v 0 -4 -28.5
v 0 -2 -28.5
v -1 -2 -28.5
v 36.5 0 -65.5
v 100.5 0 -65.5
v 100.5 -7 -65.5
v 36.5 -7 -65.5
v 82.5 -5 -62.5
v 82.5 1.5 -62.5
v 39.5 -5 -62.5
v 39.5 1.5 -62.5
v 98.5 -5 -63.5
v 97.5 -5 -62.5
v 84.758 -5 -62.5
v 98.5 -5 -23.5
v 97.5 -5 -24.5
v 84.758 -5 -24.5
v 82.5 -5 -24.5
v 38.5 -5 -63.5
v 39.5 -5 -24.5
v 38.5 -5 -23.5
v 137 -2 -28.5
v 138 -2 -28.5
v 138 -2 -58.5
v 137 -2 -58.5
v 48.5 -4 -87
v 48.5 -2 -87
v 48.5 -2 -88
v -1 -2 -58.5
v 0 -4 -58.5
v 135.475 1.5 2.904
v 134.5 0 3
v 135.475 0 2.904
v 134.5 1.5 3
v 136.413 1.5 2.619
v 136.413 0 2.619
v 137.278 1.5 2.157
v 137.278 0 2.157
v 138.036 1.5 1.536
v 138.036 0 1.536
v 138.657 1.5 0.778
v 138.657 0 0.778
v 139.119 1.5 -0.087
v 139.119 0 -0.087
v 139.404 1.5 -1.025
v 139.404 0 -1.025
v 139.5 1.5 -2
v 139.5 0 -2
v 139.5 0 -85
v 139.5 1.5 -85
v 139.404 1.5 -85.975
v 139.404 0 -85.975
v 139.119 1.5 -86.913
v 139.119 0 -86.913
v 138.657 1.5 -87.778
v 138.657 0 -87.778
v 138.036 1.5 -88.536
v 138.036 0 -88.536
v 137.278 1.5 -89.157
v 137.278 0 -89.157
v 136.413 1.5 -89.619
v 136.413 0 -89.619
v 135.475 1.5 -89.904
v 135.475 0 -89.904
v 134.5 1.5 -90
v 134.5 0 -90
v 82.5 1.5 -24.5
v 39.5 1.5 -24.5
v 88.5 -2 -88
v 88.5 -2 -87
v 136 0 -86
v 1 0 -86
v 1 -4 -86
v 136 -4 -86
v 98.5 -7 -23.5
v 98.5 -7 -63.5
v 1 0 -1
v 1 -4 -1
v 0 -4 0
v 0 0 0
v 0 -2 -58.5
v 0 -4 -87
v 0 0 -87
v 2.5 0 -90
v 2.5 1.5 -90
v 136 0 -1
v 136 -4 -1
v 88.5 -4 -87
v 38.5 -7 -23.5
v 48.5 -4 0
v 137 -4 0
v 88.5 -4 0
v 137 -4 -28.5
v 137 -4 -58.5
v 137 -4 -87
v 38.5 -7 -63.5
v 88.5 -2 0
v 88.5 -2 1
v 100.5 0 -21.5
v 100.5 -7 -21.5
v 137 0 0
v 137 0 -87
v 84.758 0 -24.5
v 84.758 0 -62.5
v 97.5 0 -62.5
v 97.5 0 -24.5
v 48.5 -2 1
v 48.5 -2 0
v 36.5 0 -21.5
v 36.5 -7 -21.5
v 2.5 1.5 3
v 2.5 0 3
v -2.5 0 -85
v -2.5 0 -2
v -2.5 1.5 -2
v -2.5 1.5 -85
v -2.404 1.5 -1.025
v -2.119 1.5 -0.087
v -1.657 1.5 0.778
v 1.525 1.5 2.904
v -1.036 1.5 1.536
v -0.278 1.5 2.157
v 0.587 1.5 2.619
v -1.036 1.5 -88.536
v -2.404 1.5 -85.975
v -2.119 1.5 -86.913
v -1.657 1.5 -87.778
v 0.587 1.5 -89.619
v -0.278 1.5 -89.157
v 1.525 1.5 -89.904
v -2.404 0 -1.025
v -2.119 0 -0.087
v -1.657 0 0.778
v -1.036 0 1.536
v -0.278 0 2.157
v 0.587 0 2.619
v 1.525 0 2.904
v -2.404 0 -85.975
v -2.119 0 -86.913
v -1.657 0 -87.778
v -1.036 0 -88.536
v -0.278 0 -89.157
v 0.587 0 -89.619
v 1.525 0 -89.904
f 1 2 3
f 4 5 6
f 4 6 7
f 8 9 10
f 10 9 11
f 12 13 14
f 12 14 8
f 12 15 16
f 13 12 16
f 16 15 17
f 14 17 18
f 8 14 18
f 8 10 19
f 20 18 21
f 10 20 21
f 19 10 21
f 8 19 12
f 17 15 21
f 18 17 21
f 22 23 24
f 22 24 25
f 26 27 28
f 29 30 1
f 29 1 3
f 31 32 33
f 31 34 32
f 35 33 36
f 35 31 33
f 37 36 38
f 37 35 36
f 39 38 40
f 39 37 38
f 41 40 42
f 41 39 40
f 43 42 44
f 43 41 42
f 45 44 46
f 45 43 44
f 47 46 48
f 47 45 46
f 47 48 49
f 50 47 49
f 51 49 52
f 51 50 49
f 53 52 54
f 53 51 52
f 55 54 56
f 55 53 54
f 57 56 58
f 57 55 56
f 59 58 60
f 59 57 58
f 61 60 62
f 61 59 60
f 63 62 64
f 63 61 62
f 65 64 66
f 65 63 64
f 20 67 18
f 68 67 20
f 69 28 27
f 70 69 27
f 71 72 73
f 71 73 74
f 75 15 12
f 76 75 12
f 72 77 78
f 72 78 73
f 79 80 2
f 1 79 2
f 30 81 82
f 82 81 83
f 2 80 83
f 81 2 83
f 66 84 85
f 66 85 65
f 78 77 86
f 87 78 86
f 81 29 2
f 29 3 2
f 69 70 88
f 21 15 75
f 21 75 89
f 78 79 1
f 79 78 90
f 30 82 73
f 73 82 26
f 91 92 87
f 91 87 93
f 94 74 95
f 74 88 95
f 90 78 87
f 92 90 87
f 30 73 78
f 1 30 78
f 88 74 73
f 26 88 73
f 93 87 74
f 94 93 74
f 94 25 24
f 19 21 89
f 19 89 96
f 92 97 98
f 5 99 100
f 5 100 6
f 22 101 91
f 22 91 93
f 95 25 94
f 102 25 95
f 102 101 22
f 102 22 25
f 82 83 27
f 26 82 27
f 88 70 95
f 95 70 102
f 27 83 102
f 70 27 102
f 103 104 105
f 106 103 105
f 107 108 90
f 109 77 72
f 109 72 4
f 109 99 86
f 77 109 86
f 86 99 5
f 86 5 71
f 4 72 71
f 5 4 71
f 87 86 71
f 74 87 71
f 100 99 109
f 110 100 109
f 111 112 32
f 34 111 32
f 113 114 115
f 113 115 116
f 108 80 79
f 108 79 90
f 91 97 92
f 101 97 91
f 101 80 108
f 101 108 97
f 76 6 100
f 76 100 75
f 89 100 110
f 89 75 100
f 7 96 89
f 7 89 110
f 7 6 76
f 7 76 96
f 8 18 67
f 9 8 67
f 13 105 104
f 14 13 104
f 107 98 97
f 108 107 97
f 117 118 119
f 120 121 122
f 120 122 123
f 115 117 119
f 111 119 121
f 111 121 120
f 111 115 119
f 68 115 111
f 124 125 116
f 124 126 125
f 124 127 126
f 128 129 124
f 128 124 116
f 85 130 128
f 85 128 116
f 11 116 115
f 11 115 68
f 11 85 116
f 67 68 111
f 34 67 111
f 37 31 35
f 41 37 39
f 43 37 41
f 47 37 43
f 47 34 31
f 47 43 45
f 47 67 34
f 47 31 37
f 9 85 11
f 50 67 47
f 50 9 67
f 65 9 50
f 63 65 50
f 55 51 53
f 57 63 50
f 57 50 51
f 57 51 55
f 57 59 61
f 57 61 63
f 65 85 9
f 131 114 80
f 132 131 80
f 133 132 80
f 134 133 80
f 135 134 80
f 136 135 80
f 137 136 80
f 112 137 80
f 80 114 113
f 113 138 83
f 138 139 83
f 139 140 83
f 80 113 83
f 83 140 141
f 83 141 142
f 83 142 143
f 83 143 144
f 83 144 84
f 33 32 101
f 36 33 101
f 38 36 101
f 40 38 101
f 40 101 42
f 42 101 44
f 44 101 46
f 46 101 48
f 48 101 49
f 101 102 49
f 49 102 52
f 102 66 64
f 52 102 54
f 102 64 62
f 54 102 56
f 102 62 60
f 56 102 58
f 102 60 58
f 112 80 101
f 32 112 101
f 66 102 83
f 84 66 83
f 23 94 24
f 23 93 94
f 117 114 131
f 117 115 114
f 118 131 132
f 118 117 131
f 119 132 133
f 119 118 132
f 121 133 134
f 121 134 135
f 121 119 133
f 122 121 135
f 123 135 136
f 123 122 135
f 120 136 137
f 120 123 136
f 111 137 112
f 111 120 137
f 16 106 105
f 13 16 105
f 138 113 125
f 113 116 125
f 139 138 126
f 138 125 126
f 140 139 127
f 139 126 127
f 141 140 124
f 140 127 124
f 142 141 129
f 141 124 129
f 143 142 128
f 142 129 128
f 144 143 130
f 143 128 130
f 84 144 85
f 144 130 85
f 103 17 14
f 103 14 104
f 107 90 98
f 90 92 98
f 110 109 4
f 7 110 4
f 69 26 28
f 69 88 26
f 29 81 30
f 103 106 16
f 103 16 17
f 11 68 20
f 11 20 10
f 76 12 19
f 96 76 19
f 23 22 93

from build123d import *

# Parameters (mm, degrees)
SKETCH1_W                = 142
SKETCH1_H                = 93
BOSS_EXTRUDE1_DEPTH      = 1.5
SKETCH3_W                = 137
SKETCH3_H                = 87
SKETCH3_W_2              = 135
SKETCH3_H_2              = 85
EXTRUDE_THIN1_DEPTH      = 4
FILLET1_R                = 5
BOSS_EXTRUDE2_DEPTH      = 20
BOSS_EXTRUDE2_DEPTH_BACK = 20
BOSS_EXTRUDE3_DEPTH      = 15
BOSS_EXTRUDE3_DEPTH_BACK = 15
SKETCH6_W                = 58
SKETCH6_H                = 38
CUT_EXTRUDE2_DEPTH       = 10
SKETCH6_5_W              = 60
SKETCH6_5_H              = 40
SKETCH6_5_W_2            = 58
SKETCH6_5_H_2            = 38
BOSS_EXTRUDE4_DEPTH      = 5
SKETCH6_6_W              = 64
SKETCH6_6_H              = 44
SKETCH6_6_W_2            = 60
SKETCH6_6_H_2            = 40
BOSS_EXTRUDE5_DEPTH      = 7
SKETCH7_W                = 15
SKETCH7_H                = 38
BOSS_EXTRUDE6_DEPTH      = 1.5
BOSS_EXTRUDE7_REACH      = 67.5
SKETCH8_W                = 2.25753837
SKETCH8_H                = 5


with BuildPart() as part:
    # Sketch1 → Boss-Extrude1 (new body)
    with BuildSketch(Plane(origin=(0, 0, 0), x_dir=(1, 0, 0), z_dir=(0, 1, 0))):
        with Locations((68.5, 43.5)):
            Rectangle(SKETCH1_W, SKETCH1_H)
    extrude(amount=BOSS_EXTRUDE1_DEPTH)

    # Fillet1
    fillet1_edges = [part.edges().sort_by_distance(p)[0] for p in [
        (-2.5, 0.75, -90),
        (139.5, 0.75, -90),
        (139.5, 0.75, 3),
        (-2.5, 0.75, 3),
    ]]
    fillet(fillet1_edges, radius=FILLET1_R)

    # Sketch6 → Cut-Extrude2 (cut)
    with BuildSketch(Plane(origin=(0, 0, 0), x_dir=(-1, 0, 0), z_dir=(0, -1, 0))):
        with Locations((-68.5, 43.5)):
            Rectangle(SKETCH6_W, SKETCH6_H)
    extrude(amount=-CUT_EXTRUDE2_DEPTH, mode=Mode.SUBTRACT)


with BuildPart() as body_2:
    # Sketch3 → Extrude-Thin1 (new body)
    with BuildSketch(Plane(origin=(0, 0, 0), x_dir=(1, 0, 0), z_dir=(0, 1, 0))):
        with Locations((68.5, 43.5)):
            Rectangle(SKETCH3_W, SKETCH3_H)
        with Locations((68.5, 43.5)):
            Rectangle(SKETCH3_W_2, SKETCH3_H_2, mode=Mode.SUBTRACT)
    extrude(amount=-EXTRUDE_THIN1_DEPTH)

    # Sketch4 → Boss-Extrude2 (add, two sides)
    with BuildSketch(Plane(origin=(68.5, 0, 0), x_dir=(0, 0, -1), z_dir=(1, 0, 0))) as boss_extrude2_sk:
        Polygon((87, -2), (87, -4), (88, -2), align=None)
        Polygon((-1, -2), (0, -2), (0, -4), align=None)
    extrude(amount=BOSS_EXTRUDE2_DEPTH)
    extrude(boss_extrude2_sk.sketch, amount=-BOSS_EXTRUDE2_DEPTH_BACK)

    # Sketch5 → Boss-Extrude3 (add, two sides)
    with BuildSketch(Plane.XY.offset(-43.5)) as boss_extrude3_sk:
        Polygon((137, -2), (137, -4), (138, -2), align=None)
        Polygon((-1, -2), (0, -2), (0, -4), align=None)
    extrude(amount=BOSS_EXTRUDE3_DEPTH)
    extrude(boss_extrude3_sk.sketch, amount=-BOSS_EXTRUDE3_DEPTH_BACK)


    add(part.part)  # Boss-Extrude4 merges part
    # Sketch6_5 → Boss-Extrude4 (add)
    with BuildSketch(Plane(origin=(0, 0, 0), x_dir=(-1, 0, 0), z_dir=(0, -1, 0))):
        with Locations((-68.5, 43.5)):
            Rectangle(SKETCH6_5_W, SKETCH6_5_H)
        with Locations((-68.5, 43.5)):
            Rectangle(SKETCH6_5_W_2, SKETCH6_5_H_2, mode=Mode.SUBTRACT)
    extrude(amount=BOSS_EXTRUDE4_DEPTH)

    # Sketch6_6 → Boss-Extrude5 (add)
    with BuildSketch(Plane(origin=(0, 0, 0), x_dir=(-1, 0, 0), z_dir=(0, -1, 0))):
        with Locations((-68.5, 43.5)):
            Rectangle(SKETCH6_6_W, SKETCH6_6_H)
        with Locations((-68.5, 43.5)):
            Rectangle(SKETCH6_6_W_2, SKETCH6_6_H_2, mode=Mode.SUBTRACT)
    extrude(amount=BOSS_EXTRUDE5_DEPTH)

    # Sketch7 → Boss-Extrude6 (add)
    with BuildSketch(Plane(origin=(0, 1.5, 0), x_dir=(1, 0, 0), z_dir=(0, 1, 0))):
        with Locations((90, 43.5)):
            Rectangle(SKETCH7_W, SKETCH7_H)
    extrude(amount=-BOSS_EXTRUDE6_DEPTH)

    # Sketch8 → Boss-Extrude7 (add, up to next)
    with BuildSketch(Plane(origin=(0, 0, -24.5), x_dir=(-1, 0, 0), z_dir=(0, 0, -1)), mode=Mode.PRIVATE) as boss_extrude7_sk1:
        with Locations((-83.628769185, -2.5)):
            Rectangle(SKETCH8_W, SKETCH8_H)
    boss_extrude7_tool1 = extrude(boss_extrude7_sk1.sketch, amount=BOSS_EXTRUDE7_REACH, mode=Mode.PRIVATE) - body_2.part
    add(boss_extrude7_tool1.solids().sort_by_distance((83.628769, -2.5, -24.5))[0])


solid = body_2.part
